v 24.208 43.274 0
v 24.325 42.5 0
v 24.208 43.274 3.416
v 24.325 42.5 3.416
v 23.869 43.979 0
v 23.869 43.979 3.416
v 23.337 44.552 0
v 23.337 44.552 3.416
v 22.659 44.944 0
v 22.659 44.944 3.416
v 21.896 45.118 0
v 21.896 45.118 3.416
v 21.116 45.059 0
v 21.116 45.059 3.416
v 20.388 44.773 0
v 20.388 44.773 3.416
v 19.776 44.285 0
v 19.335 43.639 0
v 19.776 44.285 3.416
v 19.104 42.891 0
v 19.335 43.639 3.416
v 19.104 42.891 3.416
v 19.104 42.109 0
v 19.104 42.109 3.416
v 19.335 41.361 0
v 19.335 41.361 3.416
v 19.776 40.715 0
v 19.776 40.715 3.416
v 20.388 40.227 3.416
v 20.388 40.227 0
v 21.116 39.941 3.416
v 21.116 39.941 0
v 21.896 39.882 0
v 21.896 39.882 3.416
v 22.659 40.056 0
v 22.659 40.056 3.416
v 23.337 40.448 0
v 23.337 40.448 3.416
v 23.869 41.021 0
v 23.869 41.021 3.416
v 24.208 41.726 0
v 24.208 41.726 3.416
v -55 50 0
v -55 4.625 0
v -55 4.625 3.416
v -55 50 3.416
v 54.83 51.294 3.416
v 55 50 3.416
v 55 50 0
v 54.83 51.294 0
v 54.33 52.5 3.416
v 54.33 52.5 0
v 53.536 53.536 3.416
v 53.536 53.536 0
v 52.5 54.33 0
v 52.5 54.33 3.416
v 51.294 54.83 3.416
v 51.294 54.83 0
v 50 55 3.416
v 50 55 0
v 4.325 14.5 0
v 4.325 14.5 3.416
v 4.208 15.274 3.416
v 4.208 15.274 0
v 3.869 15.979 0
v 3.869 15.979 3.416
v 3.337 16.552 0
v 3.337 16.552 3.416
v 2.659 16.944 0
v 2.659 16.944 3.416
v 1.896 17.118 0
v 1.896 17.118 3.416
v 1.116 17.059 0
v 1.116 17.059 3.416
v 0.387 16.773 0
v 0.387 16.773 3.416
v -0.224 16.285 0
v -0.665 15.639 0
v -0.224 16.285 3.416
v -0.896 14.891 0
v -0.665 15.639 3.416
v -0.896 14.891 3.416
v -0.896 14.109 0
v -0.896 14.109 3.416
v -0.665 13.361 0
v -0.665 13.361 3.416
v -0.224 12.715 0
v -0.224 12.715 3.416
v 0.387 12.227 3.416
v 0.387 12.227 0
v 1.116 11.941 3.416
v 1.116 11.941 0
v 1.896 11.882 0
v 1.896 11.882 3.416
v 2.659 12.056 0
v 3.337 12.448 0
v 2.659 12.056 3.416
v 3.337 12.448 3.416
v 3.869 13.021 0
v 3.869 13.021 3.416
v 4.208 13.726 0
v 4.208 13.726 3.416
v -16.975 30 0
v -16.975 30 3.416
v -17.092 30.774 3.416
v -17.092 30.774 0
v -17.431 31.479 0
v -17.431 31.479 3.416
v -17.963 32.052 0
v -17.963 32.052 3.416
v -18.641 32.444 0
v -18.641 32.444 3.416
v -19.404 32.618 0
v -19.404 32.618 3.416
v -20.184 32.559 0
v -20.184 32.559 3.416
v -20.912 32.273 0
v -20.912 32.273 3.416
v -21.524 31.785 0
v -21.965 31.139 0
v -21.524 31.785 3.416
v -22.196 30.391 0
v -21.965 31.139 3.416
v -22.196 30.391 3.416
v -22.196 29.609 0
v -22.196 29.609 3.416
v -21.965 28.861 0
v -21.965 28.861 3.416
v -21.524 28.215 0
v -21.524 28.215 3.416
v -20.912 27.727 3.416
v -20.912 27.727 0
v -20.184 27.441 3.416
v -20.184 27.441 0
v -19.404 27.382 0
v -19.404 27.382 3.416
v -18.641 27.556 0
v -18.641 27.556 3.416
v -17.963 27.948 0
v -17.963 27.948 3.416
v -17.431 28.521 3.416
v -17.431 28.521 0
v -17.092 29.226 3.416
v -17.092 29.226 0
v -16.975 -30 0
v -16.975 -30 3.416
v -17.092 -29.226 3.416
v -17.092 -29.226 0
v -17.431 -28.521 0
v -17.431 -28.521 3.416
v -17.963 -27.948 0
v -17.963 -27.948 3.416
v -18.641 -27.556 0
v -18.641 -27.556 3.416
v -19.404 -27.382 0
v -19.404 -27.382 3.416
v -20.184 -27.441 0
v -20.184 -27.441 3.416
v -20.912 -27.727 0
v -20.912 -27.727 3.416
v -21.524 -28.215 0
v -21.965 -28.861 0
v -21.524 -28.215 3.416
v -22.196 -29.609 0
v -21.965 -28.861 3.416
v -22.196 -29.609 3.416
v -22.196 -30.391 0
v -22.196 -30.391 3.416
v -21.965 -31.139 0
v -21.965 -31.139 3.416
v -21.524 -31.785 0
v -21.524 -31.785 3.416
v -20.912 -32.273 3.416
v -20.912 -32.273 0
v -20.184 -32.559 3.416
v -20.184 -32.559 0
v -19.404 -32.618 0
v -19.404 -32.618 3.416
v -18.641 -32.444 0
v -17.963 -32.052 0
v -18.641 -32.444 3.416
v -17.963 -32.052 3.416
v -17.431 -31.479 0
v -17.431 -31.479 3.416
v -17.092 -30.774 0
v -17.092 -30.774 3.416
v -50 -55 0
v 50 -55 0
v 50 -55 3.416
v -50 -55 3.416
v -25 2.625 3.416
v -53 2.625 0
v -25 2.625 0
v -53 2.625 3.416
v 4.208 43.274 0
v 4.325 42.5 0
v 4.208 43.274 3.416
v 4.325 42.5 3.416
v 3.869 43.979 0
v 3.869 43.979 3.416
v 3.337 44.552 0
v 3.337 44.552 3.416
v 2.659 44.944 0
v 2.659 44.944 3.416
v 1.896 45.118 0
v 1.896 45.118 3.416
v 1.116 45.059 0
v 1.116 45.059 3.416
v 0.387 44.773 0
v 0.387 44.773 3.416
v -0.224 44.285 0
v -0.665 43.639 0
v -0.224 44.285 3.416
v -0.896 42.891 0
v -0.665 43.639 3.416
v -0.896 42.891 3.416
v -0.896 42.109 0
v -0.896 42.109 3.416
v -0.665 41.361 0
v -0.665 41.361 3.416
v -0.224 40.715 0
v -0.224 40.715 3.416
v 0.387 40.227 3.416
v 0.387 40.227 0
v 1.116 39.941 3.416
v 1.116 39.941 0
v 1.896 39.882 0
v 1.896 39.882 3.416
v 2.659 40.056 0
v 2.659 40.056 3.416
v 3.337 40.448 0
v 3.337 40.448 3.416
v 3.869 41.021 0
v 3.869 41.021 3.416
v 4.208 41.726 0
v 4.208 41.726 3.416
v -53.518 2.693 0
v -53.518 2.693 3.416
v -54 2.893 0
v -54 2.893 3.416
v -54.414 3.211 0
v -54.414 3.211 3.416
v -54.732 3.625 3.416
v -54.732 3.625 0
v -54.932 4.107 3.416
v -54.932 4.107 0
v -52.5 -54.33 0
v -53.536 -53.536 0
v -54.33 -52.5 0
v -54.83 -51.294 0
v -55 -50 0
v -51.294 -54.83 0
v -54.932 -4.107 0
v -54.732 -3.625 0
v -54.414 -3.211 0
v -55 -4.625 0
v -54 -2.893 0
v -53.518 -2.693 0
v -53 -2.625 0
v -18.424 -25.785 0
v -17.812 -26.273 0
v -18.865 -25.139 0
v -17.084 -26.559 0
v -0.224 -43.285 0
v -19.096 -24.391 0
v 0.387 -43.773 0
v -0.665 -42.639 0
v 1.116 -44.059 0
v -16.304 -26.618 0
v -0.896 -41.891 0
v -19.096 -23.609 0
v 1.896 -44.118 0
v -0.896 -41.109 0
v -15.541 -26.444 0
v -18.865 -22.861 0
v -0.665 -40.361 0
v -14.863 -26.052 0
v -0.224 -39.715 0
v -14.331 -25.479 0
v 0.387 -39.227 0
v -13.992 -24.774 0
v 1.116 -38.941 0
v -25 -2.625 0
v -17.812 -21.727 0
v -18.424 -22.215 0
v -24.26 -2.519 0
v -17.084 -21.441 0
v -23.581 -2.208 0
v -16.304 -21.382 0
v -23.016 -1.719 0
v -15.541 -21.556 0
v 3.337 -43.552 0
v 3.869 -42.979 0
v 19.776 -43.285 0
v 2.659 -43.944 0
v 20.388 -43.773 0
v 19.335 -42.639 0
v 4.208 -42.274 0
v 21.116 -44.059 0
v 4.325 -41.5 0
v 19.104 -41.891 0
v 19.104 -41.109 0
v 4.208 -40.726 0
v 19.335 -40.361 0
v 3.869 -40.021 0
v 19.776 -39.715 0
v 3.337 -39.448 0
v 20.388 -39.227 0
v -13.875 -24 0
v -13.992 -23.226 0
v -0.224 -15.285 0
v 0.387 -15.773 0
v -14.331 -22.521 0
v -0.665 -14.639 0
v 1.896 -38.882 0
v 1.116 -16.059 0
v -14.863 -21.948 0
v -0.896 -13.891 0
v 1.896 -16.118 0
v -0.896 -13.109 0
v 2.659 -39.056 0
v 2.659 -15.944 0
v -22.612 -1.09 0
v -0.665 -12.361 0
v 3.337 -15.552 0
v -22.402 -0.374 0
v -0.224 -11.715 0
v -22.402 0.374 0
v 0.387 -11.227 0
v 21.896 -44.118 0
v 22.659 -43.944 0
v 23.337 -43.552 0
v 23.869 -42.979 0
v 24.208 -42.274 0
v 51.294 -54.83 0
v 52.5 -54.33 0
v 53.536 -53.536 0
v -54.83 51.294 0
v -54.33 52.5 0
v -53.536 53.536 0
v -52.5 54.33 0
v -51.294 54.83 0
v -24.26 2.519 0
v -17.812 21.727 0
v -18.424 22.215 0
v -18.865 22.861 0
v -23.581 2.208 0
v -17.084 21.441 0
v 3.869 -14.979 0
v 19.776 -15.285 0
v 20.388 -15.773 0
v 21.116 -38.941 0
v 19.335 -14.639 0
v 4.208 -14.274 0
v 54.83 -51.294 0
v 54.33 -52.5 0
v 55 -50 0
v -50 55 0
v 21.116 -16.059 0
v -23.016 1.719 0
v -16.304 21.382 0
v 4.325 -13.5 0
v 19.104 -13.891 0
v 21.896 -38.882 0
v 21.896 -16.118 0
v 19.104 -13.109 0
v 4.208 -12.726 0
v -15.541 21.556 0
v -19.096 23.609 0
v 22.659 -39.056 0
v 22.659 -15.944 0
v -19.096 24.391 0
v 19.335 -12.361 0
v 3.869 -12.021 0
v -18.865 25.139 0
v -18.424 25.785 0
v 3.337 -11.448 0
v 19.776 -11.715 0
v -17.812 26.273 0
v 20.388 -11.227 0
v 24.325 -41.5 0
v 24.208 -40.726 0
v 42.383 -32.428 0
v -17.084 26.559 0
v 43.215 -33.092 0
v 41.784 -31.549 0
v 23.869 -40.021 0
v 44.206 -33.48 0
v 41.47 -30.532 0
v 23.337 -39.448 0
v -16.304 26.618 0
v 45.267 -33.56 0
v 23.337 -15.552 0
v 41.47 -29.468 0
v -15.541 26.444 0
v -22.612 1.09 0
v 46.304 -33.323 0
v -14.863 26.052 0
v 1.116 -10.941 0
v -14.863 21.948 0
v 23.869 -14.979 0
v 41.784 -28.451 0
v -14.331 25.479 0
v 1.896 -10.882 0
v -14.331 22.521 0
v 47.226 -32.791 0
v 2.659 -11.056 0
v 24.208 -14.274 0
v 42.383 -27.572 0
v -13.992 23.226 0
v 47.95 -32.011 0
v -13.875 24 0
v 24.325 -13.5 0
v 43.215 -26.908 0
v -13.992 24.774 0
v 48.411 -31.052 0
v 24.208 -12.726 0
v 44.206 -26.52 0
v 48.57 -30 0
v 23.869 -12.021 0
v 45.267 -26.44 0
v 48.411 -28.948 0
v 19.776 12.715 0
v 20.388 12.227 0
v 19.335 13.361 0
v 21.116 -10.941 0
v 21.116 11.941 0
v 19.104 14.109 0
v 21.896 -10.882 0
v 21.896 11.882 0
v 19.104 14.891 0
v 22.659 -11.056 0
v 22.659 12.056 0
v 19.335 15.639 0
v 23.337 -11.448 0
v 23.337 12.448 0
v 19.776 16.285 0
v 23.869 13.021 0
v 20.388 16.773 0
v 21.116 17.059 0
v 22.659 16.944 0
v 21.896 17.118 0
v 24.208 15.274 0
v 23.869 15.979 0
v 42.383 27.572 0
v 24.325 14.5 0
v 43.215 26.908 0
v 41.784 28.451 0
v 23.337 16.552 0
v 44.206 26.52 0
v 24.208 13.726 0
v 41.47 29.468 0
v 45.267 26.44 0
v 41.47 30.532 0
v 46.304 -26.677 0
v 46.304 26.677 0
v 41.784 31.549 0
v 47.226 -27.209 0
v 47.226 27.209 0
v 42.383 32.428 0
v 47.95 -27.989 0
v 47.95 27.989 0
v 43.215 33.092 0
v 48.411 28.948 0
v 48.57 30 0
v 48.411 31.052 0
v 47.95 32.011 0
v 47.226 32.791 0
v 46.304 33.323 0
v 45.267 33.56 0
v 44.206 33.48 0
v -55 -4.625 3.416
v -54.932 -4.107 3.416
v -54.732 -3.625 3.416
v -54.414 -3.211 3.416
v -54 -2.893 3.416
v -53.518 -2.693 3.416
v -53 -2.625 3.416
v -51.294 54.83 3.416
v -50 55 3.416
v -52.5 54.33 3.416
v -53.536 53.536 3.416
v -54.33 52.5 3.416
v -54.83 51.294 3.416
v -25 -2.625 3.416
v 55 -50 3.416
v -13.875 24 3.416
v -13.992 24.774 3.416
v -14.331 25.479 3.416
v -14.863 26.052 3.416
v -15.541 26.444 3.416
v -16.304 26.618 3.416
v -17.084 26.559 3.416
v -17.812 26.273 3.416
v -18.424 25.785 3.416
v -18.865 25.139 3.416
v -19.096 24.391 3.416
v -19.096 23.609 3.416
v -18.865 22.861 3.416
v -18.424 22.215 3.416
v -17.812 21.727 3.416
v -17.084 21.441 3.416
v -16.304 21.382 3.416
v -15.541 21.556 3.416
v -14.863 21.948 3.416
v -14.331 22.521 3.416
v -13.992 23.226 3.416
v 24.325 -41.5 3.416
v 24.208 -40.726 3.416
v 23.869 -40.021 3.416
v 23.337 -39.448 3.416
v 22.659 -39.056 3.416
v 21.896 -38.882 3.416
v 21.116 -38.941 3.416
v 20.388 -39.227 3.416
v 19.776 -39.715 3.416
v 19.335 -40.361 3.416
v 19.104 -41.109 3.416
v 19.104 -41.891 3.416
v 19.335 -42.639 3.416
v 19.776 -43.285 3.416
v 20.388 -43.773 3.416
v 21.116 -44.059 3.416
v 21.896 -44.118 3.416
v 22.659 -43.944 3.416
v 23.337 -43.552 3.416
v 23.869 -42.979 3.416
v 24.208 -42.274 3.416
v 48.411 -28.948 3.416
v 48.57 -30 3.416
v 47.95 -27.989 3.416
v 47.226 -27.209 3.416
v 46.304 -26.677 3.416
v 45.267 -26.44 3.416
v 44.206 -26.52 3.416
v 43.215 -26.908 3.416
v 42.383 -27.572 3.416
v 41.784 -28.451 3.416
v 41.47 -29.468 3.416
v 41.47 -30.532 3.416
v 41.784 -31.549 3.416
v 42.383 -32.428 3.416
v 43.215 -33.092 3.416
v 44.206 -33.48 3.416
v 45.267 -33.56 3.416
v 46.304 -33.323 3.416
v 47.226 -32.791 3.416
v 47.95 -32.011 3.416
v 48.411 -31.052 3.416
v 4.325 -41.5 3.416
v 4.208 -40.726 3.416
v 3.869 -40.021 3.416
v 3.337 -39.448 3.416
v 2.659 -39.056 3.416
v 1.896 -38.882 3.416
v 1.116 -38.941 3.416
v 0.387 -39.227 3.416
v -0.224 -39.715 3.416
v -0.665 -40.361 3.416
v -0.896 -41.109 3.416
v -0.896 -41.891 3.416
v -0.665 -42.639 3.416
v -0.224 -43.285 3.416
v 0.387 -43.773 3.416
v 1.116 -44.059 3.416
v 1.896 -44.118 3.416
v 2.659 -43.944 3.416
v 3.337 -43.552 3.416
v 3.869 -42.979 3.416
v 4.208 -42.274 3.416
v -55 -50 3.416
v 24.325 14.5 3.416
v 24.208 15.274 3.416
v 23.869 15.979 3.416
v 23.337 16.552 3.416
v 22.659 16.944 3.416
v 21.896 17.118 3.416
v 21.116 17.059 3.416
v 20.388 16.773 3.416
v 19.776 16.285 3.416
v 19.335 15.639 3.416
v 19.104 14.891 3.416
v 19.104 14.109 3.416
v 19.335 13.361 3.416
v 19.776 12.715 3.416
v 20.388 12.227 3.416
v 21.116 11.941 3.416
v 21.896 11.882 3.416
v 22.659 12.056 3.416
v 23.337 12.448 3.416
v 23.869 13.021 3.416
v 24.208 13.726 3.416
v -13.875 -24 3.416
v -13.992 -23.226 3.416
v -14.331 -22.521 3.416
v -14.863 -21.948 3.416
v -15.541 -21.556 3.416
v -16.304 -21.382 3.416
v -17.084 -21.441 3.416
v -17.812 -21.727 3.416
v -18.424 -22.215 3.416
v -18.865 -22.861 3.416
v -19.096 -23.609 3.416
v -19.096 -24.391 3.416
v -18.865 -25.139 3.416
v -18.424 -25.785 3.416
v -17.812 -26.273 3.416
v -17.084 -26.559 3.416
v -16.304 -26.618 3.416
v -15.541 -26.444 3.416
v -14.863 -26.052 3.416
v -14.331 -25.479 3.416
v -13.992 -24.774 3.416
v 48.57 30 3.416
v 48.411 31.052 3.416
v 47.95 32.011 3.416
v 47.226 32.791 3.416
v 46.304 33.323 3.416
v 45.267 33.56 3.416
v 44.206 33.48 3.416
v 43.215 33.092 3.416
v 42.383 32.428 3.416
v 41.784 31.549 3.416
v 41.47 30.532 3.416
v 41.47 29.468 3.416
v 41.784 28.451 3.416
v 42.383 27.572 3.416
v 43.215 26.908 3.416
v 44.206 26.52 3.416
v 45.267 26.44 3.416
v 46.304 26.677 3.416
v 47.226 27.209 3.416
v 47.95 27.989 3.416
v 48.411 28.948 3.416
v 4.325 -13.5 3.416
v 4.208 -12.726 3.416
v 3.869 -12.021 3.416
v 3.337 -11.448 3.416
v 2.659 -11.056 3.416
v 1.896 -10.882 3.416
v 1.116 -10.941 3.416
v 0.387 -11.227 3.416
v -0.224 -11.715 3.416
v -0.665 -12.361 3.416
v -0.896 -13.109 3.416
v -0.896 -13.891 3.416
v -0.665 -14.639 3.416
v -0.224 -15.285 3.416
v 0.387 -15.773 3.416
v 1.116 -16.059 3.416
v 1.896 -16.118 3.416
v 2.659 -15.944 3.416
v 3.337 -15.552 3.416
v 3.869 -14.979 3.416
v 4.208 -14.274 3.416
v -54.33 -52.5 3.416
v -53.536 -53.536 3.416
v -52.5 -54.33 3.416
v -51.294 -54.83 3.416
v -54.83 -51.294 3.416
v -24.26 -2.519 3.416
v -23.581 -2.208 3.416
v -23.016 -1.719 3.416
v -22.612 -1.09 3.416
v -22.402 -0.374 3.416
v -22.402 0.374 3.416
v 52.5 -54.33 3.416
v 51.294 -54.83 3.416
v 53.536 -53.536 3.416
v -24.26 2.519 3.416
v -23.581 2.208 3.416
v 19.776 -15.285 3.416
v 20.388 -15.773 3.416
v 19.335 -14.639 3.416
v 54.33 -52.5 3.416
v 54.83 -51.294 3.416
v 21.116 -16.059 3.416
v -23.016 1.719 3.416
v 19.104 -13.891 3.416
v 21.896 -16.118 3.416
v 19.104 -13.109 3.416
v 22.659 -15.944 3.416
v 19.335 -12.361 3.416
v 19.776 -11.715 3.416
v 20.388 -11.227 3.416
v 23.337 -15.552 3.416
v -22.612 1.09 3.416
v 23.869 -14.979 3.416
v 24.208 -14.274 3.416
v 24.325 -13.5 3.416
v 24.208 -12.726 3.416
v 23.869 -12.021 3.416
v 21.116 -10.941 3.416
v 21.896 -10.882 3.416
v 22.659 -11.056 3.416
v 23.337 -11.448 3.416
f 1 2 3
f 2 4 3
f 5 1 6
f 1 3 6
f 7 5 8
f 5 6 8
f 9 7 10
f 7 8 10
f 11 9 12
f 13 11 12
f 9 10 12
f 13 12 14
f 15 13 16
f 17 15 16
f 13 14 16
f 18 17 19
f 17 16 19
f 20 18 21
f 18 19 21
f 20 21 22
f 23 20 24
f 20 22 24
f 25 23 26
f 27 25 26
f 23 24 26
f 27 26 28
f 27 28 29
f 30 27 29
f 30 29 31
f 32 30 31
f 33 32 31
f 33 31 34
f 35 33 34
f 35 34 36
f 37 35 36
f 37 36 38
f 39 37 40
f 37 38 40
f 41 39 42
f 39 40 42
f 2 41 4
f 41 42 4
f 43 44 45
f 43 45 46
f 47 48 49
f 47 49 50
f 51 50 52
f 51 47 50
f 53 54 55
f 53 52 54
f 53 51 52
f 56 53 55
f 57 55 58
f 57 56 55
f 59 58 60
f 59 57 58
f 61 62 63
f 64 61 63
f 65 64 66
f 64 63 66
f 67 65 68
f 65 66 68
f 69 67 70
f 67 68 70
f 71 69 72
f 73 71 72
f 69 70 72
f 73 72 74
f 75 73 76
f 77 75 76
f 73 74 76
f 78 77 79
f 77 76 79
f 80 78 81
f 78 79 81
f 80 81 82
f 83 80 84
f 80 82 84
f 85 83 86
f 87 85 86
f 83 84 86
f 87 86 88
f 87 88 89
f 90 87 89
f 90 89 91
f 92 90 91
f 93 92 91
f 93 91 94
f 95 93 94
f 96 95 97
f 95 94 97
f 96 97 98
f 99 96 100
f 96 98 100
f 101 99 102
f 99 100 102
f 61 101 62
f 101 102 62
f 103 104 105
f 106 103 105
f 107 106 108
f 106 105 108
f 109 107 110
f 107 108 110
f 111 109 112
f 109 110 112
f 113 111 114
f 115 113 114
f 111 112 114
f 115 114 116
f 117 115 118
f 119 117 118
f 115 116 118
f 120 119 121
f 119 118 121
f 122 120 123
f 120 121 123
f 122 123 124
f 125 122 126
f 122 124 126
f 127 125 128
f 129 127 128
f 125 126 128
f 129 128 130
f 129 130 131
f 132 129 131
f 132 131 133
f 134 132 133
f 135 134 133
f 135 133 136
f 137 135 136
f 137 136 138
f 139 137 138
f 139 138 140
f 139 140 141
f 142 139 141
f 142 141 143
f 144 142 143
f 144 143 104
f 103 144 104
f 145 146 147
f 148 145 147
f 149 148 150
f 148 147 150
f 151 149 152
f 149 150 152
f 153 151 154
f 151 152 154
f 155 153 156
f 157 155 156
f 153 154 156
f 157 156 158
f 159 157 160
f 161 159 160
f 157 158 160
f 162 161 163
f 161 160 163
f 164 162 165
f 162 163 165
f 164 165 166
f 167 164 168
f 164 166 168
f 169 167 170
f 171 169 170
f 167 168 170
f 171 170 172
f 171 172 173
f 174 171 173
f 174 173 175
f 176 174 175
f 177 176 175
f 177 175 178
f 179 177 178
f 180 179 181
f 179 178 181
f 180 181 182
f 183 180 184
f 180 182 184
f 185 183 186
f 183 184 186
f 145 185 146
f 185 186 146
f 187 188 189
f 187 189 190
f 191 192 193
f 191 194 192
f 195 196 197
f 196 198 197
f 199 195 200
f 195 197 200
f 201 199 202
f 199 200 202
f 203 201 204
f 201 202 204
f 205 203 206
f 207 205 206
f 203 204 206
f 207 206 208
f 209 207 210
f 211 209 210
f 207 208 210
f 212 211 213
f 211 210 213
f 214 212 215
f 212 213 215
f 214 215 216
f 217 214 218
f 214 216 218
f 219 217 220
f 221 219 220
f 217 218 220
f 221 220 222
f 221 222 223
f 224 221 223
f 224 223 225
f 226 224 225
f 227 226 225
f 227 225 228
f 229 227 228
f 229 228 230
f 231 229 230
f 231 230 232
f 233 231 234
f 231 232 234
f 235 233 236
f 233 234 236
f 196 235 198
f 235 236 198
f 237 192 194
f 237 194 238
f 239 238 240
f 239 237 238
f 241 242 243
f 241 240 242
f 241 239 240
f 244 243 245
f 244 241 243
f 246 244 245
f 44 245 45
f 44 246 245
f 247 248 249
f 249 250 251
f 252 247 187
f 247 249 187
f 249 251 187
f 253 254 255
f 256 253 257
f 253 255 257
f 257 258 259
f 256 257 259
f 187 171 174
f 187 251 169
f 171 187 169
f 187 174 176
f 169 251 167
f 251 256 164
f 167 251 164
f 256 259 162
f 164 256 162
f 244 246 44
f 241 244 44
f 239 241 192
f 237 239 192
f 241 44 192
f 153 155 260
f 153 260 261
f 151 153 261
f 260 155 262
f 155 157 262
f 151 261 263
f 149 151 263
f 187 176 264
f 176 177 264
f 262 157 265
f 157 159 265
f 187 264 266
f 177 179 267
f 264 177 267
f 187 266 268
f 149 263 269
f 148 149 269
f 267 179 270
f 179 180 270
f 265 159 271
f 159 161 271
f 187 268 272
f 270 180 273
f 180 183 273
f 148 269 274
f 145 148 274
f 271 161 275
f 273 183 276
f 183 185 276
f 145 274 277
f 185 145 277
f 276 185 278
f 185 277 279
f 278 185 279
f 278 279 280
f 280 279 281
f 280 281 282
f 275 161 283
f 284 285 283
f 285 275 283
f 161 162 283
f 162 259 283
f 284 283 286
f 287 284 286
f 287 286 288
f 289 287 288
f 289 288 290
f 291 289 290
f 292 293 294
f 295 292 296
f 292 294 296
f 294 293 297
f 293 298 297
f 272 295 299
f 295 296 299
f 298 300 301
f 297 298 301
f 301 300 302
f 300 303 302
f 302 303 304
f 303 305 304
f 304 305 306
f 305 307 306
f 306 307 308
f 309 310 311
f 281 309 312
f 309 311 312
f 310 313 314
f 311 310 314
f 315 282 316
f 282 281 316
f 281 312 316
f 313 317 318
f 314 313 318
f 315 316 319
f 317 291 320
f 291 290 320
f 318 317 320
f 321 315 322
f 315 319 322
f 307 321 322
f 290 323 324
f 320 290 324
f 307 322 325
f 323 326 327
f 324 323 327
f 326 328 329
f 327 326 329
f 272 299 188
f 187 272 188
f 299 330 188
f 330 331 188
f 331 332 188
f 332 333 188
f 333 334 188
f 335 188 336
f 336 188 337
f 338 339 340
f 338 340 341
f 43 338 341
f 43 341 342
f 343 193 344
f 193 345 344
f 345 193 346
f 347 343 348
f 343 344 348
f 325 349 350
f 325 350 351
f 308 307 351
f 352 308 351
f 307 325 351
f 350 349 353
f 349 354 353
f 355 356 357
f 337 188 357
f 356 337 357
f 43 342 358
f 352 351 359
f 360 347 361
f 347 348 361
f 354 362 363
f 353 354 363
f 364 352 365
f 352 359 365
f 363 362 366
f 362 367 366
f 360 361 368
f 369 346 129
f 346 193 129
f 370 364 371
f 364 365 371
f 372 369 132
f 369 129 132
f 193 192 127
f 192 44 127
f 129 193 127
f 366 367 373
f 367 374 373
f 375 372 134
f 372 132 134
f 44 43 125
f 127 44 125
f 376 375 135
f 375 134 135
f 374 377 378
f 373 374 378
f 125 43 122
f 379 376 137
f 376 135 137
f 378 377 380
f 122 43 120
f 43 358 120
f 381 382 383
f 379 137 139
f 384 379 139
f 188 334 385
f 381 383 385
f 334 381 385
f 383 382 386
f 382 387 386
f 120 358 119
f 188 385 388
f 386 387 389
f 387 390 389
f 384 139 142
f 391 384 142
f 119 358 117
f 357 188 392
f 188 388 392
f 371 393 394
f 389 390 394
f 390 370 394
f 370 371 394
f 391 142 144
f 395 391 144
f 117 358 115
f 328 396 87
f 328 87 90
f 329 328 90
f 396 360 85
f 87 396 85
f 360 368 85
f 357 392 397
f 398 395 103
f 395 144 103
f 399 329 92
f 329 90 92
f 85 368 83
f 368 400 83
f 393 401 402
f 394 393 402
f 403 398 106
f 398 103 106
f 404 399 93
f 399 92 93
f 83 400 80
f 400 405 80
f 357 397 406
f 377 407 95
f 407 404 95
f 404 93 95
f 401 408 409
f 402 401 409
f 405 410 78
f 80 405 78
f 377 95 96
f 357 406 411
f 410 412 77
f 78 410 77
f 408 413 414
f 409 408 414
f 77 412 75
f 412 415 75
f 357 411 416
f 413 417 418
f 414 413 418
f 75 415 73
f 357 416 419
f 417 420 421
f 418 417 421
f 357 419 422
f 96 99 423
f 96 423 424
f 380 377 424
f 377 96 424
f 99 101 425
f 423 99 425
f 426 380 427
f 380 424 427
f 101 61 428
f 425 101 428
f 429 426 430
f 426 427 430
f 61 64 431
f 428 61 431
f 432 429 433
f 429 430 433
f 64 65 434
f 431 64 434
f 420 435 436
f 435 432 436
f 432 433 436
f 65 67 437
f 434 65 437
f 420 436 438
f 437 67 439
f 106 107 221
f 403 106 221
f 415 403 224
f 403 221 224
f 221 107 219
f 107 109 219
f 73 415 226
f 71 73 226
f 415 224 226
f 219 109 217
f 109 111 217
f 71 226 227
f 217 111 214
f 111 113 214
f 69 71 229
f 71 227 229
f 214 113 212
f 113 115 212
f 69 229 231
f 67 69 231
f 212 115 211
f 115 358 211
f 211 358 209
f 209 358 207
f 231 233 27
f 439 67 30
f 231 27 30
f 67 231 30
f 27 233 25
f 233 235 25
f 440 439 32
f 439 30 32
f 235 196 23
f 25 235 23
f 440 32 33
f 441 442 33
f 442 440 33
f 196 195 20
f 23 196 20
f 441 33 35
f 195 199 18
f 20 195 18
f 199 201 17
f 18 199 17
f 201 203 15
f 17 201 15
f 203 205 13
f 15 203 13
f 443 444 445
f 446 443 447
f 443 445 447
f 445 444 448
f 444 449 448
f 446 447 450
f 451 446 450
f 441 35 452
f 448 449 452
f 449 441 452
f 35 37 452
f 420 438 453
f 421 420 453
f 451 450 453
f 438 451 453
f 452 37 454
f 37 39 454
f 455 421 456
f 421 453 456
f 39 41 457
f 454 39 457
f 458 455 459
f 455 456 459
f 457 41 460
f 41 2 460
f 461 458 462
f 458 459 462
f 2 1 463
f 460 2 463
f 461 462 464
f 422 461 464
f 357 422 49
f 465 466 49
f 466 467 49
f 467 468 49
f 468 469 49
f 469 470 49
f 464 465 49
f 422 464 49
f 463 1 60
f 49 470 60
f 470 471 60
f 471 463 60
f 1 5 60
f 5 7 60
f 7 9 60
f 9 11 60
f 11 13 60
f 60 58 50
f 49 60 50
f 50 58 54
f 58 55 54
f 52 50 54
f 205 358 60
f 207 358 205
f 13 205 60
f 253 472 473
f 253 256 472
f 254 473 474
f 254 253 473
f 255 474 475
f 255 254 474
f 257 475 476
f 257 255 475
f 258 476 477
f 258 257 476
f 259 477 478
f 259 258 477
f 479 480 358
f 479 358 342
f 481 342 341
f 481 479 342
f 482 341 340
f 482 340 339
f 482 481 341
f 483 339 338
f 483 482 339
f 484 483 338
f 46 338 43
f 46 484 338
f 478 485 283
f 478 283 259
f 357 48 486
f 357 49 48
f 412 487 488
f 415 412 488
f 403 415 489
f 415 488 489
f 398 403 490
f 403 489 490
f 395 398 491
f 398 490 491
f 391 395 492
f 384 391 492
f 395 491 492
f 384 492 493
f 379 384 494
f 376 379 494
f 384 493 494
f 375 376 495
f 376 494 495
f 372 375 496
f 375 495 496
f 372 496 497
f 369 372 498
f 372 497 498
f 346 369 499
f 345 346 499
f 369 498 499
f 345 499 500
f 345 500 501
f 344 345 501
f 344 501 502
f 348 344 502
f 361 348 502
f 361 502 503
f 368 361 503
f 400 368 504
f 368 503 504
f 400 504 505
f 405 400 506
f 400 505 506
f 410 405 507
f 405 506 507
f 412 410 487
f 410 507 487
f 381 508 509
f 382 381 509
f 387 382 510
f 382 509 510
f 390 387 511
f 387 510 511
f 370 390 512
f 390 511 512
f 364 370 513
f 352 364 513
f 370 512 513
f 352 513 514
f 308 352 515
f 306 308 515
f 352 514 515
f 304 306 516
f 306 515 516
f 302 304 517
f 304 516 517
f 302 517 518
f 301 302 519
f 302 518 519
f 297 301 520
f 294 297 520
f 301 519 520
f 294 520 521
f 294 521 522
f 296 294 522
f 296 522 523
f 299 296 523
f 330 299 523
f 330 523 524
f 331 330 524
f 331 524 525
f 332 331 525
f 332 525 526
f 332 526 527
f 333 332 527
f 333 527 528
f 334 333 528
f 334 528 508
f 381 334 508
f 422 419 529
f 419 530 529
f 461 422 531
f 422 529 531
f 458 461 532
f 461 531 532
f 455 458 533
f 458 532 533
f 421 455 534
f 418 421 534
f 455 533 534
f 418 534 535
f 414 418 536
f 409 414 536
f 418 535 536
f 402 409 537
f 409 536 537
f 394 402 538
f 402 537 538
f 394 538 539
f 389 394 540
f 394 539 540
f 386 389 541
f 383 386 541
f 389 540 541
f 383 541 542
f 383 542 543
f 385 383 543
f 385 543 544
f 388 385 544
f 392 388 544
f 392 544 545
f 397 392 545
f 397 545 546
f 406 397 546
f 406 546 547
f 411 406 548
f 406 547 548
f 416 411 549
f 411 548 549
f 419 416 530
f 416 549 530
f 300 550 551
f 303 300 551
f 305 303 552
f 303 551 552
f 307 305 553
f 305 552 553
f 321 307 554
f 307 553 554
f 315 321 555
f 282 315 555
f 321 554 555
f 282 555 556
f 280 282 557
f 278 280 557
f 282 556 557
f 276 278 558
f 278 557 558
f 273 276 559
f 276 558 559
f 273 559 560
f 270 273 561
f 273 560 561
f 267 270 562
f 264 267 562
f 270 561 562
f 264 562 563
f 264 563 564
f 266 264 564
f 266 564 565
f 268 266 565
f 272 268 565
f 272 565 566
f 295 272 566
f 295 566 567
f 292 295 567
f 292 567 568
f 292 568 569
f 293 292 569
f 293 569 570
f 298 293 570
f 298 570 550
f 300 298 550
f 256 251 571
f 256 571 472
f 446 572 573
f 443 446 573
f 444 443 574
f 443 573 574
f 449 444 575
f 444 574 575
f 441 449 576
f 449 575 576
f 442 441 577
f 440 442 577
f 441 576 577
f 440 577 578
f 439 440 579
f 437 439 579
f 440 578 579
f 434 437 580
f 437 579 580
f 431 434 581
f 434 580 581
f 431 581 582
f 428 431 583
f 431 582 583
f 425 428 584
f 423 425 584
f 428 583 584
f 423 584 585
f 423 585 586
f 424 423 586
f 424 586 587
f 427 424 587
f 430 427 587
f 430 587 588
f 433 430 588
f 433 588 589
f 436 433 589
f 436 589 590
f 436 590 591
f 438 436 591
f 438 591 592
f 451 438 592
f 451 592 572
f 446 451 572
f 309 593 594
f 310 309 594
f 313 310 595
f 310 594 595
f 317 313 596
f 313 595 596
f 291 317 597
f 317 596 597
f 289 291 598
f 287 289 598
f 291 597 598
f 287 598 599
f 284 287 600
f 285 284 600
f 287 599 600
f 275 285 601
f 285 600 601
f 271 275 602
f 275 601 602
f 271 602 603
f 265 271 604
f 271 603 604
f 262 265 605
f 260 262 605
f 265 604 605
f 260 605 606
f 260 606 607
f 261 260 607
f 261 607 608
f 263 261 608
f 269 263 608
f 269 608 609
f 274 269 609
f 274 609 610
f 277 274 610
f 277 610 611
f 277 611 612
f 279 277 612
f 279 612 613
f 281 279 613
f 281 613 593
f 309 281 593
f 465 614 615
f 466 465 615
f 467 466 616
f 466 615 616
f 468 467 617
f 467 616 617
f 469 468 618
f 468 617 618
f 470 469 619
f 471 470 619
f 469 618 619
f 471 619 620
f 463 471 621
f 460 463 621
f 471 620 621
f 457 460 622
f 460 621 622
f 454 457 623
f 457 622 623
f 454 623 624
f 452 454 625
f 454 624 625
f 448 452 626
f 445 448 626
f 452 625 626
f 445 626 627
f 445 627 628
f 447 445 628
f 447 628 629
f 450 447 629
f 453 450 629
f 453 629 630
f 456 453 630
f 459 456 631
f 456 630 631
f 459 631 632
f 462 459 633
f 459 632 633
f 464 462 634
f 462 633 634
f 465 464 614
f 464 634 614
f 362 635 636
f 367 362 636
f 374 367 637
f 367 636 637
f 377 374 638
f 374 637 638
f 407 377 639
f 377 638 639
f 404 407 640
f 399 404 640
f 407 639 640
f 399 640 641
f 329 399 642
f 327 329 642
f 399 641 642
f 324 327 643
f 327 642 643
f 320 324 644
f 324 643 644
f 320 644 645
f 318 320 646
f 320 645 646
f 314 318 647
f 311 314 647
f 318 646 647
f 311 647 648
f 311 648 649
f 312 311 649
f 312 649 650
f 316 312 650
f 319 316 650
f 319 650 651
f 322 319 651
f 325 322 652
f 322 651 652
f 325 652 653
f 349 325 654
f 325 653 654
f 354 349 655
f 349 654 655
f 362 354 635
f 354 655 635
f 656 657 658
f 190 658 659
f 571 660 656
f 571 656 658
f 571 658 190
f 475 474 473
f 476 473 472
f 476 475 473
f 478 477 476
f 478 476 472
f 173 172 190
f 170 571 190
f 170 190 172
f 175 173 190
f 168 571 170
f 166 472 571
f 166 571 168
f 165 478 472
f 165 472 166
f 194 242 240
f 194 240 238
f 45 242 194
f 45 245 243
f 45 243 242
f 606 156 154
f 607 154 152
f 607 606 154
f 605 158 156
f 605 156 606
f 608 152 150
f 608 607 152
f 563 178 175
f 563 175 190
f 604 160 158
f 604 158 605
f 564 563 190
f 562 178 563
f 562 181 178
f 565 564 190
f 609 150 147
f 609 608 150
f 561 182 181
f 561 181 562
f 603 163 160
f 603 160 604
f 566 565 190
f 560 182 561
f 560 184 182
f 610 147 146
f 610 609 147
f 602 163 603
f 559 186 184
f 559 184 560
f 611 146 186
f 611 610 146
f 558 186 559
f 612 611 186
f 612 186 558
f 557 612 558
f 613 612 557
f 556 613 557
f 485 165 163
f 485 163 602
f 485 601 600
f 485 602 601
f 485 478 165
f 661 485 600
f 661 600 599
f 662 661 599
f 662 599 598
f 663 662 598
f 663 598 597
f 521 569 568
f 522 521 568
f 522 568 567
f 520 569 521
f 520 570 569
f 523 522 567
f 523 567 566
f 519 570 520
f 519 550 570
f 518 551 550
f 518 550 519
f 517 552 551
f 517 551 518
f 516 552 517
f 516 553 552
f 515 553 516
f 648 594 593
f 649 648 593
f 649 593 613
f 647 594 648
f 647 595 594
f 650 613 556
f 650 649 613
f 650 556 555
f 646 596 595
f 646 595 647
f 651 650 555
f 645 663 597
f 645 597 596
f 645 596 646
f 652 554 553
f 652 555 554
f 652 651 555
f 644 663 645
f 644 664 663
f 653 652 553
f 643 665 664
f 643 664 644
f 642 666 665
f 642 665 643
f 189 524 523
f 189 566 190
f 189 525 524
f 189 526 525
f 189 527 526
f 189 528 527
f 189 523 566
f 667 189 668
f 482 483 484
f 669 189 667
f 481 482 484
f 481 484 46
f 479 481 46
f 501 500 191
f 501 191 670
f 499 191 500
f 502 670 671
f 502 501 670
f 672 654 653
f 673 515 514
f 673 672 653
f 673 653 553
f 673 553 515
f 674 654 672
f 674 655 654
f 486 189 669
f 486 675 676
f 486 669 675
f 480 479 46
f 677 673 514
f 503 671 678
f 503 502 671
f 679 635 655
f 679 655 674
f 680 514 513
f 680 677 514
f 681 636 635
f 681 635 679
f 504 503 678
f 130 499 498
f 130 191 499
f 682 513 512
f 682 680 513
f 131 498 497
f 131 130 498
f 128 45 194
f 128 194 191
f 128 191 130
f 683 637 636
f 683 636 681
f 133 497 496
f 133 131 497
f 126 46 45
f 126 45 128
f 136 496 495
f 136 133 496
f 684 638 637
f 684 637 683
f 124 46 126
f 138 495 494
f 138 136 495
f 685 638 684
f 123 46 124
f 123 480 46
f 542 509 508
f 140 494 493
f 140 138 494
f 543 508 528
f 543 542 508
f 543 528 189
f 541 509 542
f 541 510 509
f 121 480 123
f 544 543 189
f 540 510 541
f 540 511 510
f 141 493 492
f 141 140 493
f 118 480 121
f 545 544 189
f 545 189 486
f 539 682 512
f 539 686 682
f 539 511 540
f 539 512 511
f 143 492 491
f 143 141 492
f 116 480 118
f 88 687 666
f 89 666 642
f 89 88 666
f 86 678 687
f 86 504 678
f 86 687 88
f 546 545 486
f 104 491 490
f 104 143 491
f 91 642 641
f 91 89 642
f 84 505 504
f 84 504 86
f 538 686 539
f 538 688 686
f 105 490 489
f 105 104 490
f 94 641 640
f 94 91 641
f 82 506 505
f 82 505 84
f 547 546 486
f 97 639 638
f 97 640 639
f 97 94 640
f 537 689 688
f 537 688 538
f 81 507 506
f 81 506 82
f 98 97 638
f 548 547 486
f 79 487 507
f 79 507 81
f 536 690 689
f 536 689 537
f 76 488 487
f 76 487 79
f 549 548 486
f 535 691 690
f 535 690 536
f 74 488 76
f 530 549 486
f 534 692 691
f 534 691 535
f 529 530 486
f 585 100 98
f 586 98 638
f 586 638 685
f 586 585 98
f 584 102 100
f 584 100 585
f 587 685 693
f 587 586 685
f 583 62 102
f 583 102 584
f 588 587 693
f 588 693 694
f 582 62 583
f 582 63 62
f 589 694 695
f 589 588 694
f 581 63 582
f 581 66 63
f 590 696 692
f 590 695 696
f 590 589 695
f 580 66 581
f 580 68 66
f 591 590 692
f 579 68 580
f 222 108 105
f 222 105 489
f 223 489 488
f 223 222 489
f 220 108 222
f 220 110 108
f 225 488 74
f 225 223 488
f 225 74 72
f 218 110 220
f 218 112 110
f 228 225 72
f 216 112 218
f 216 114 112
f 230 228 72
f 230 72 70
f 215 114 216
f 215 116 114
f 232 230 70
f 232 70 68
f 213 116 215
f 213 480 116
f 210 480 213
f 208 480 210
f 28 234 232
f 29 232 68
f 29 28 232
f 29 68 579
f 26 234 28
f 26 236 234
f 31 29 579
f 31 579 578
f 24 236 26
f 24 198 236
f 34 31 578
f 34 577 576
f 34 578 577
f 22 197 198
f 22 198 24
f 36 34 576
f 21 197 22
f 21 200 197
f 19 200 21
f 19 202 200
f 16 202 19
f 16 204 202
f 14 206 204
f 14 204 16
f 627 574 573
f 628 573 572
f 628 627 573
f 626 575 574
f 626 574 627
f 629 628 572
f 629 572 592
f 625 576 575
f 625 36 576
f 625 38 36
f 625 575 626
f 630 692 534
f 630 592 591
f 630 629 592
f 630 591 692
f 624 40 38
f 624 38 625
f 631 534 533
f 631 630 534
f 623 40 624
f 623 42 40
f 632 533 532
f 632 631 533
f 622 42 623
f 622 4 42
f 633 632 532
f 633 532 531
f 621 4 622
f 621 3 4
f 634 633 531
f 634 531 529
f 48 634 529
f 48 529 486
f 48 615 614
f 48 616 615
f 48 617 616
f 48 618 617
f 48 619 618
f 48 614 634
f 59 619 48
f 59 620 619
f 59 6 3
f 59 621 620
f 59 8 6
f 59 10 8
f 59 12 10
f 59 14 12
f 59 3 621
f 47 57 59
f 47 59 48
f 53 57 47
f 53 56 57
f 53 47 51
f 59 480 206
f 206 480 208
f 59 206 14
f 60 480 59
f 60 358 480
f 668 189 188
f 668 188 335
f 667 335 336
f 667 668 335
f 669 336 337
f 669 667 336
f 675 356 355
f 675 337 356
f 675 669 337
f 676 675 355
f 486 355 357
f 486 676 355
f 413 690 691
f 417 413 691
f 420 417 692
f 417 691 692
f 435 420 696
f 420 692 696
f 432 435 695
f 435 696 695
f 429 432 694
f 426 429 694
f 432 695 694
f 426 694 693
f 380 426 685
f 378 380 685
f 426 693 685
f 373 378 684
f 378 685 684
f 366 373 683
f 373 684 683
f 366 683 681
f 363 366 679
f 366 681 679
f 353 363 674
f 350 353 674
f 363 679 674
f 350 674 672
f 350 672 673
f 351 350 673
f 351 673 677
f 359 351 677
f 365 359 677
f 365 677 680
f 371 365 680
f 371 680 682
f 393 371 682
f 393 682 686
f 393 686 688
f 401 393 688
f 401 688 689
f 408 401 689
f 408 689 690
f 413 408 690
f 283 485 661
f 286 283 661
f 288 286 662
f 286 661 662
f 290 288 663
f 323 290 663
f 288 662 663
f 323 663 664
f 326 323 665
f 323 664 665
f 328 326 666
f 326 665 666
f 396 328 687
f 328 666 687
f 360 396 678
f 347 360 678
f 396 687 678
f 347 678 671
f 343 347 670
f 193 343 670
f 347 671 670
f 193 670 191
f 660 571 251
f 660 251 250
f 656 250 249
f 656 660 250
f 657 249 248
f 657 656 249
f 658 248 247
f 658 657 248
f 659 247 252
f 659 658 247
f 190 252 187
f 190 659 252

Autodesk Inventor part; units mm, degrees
ref_plane "YZ Plane" through (0, 0, 0) normal (1, 0, 0) x (0, 1, 0)
ref_plane "XZ Plane" through (0, 0, 0) normal (0, 1, 0) x (-1, 0, 0)
ref_plane "XY Plane" through (0, 0, 0) normal (0, 0, 1) x (1, 0, 0)
sketch "Sketch1" plane through (0, 0, 0) normal (0, 0, 1) x (1, 0, 0)
  line L0 (-55, 55) -> (55, 55)
  line L1 (55, 55) -> (55, -55)
  line L2 (55, -55) -> (-55, -55)
  line L3 (-55, -55) -> (-55, 55)
  point P0 (0, 0)
  dimension "d0" = 110
  dimension "d1" = 110
  dimension "d2" = 55
  dimension "d3" = 55
extrude "Extrusion1" add sketch "Sketch1" along normal blind 3.4163
sketch "Sketch2" plane through (0, 0, 3.4163) normal (0, 0, 1) x (1, 0, 0)
  line L0 (55, 55) -> (-55, 55) projected
  circle A0 centre (45, 30) radius 3.57
  circle A1 centre (45, -30) radius 3.57
  circle A2 centre (-19.6, -30) radius 2.625
  circle A3 centre (-19.6, 30) radius 2.625
  circle A4 centre (-16.5, 24) radius 2.625
  circle A5 centre (-16.5, -24) radius 2.625
  line L1 (-55, -55) -> (55, -55) projected
  line L2 (55, -55) -> (55, 55) projected
  point P0 (0, 0)
  dimension "d6" = 7.14
  dimension "d7" = 7.14
  dimension "d8" = 5.25
  dimension "d9" = 5.25
  dimension "d10" = 60
  dimension "d11" = 25
  dimension "d12" = 64.6
  dimension "d13" = 64.6
  dimension "d14" = 60
  dimension "d16" = 25
  dimension "d20" = 5.25
  dimension "d21" = 5.25
  dimension "d22" = 71.5
  dimension "d23" = 31
  dimension "d24" = 31
  dimension "d25" = 71.5
  dimension "d27" = 10
  dimension "d28" = 10
extrude "Extrusion2" cut sketch "Sketch2" against normal through all
sketch "Sketch3" plane through (0, 0, 3.4163) normal (0, 0, 1) x (1, 0, 0)
  line L0 (55, 55) -> (-55, 55) projected
  arc A0 (-25, -2.625) -> (-25, 2.625) centre (-25, 0) ccw
  line L1 (-55, 55) -> (-55, -55) projected
  line L2 (-55, 2.625) -> (-25, 2.625)
  line L3 (-25, -2.625) -> (-55, -2.625)
  point P0 (0, 0)
  dimension "d30" = 5.25
  dimension "d33" = 55
  dimension "d38" = 30
  dimension "d39" = 30
extrude "Extrusion3" cut sketch "Sketch3" against normal through all
fillet "Fillet2" radius 5 4 edges at (-55, 55, 1.7082) (-55, -55, 1.7082) (55, 55, 1.7082) (55, -55, 1.7082)
sketch "Sketch4" plane through (0, 0, 3.4163) normal (0, 0, 1) x (1, 0, 0)
  line L0 (50, 55) -> (-50, 55) projected
  circle A0 centre (1.7, 42.5) radius 2.625
  point P0 (0, 0)
  dimension "d40" = 5.25
  dimension "d50" = 12.5
extrude "Extrusion4" cut sketch "Sketch4" against normal through all
fillet "Fillet3" radius 2 2 edges at (-55, 2.625, 1.7082) (-55, -2.625, 1.7082)
pattern_linear "Rectangular Pattern1" count 2 spacing 20 along (1, 0, 0) count 4 spacing 28 along (0, -1, 0) of "Extrusion4"
equation "\"d2\" = 0.5 * d0"
equation "\"d3\" = 0.5 * d1"
equation "\"d13\" = d12"
equation "\"d14\" = d10"
equation "\"d16\" = d11"
equation "\"d24\" = d23"
equation "\"d25\" = d22"
equation "\"d39\" = d38"
properties part number "S2_Zplate" material "Steel, Mild"
